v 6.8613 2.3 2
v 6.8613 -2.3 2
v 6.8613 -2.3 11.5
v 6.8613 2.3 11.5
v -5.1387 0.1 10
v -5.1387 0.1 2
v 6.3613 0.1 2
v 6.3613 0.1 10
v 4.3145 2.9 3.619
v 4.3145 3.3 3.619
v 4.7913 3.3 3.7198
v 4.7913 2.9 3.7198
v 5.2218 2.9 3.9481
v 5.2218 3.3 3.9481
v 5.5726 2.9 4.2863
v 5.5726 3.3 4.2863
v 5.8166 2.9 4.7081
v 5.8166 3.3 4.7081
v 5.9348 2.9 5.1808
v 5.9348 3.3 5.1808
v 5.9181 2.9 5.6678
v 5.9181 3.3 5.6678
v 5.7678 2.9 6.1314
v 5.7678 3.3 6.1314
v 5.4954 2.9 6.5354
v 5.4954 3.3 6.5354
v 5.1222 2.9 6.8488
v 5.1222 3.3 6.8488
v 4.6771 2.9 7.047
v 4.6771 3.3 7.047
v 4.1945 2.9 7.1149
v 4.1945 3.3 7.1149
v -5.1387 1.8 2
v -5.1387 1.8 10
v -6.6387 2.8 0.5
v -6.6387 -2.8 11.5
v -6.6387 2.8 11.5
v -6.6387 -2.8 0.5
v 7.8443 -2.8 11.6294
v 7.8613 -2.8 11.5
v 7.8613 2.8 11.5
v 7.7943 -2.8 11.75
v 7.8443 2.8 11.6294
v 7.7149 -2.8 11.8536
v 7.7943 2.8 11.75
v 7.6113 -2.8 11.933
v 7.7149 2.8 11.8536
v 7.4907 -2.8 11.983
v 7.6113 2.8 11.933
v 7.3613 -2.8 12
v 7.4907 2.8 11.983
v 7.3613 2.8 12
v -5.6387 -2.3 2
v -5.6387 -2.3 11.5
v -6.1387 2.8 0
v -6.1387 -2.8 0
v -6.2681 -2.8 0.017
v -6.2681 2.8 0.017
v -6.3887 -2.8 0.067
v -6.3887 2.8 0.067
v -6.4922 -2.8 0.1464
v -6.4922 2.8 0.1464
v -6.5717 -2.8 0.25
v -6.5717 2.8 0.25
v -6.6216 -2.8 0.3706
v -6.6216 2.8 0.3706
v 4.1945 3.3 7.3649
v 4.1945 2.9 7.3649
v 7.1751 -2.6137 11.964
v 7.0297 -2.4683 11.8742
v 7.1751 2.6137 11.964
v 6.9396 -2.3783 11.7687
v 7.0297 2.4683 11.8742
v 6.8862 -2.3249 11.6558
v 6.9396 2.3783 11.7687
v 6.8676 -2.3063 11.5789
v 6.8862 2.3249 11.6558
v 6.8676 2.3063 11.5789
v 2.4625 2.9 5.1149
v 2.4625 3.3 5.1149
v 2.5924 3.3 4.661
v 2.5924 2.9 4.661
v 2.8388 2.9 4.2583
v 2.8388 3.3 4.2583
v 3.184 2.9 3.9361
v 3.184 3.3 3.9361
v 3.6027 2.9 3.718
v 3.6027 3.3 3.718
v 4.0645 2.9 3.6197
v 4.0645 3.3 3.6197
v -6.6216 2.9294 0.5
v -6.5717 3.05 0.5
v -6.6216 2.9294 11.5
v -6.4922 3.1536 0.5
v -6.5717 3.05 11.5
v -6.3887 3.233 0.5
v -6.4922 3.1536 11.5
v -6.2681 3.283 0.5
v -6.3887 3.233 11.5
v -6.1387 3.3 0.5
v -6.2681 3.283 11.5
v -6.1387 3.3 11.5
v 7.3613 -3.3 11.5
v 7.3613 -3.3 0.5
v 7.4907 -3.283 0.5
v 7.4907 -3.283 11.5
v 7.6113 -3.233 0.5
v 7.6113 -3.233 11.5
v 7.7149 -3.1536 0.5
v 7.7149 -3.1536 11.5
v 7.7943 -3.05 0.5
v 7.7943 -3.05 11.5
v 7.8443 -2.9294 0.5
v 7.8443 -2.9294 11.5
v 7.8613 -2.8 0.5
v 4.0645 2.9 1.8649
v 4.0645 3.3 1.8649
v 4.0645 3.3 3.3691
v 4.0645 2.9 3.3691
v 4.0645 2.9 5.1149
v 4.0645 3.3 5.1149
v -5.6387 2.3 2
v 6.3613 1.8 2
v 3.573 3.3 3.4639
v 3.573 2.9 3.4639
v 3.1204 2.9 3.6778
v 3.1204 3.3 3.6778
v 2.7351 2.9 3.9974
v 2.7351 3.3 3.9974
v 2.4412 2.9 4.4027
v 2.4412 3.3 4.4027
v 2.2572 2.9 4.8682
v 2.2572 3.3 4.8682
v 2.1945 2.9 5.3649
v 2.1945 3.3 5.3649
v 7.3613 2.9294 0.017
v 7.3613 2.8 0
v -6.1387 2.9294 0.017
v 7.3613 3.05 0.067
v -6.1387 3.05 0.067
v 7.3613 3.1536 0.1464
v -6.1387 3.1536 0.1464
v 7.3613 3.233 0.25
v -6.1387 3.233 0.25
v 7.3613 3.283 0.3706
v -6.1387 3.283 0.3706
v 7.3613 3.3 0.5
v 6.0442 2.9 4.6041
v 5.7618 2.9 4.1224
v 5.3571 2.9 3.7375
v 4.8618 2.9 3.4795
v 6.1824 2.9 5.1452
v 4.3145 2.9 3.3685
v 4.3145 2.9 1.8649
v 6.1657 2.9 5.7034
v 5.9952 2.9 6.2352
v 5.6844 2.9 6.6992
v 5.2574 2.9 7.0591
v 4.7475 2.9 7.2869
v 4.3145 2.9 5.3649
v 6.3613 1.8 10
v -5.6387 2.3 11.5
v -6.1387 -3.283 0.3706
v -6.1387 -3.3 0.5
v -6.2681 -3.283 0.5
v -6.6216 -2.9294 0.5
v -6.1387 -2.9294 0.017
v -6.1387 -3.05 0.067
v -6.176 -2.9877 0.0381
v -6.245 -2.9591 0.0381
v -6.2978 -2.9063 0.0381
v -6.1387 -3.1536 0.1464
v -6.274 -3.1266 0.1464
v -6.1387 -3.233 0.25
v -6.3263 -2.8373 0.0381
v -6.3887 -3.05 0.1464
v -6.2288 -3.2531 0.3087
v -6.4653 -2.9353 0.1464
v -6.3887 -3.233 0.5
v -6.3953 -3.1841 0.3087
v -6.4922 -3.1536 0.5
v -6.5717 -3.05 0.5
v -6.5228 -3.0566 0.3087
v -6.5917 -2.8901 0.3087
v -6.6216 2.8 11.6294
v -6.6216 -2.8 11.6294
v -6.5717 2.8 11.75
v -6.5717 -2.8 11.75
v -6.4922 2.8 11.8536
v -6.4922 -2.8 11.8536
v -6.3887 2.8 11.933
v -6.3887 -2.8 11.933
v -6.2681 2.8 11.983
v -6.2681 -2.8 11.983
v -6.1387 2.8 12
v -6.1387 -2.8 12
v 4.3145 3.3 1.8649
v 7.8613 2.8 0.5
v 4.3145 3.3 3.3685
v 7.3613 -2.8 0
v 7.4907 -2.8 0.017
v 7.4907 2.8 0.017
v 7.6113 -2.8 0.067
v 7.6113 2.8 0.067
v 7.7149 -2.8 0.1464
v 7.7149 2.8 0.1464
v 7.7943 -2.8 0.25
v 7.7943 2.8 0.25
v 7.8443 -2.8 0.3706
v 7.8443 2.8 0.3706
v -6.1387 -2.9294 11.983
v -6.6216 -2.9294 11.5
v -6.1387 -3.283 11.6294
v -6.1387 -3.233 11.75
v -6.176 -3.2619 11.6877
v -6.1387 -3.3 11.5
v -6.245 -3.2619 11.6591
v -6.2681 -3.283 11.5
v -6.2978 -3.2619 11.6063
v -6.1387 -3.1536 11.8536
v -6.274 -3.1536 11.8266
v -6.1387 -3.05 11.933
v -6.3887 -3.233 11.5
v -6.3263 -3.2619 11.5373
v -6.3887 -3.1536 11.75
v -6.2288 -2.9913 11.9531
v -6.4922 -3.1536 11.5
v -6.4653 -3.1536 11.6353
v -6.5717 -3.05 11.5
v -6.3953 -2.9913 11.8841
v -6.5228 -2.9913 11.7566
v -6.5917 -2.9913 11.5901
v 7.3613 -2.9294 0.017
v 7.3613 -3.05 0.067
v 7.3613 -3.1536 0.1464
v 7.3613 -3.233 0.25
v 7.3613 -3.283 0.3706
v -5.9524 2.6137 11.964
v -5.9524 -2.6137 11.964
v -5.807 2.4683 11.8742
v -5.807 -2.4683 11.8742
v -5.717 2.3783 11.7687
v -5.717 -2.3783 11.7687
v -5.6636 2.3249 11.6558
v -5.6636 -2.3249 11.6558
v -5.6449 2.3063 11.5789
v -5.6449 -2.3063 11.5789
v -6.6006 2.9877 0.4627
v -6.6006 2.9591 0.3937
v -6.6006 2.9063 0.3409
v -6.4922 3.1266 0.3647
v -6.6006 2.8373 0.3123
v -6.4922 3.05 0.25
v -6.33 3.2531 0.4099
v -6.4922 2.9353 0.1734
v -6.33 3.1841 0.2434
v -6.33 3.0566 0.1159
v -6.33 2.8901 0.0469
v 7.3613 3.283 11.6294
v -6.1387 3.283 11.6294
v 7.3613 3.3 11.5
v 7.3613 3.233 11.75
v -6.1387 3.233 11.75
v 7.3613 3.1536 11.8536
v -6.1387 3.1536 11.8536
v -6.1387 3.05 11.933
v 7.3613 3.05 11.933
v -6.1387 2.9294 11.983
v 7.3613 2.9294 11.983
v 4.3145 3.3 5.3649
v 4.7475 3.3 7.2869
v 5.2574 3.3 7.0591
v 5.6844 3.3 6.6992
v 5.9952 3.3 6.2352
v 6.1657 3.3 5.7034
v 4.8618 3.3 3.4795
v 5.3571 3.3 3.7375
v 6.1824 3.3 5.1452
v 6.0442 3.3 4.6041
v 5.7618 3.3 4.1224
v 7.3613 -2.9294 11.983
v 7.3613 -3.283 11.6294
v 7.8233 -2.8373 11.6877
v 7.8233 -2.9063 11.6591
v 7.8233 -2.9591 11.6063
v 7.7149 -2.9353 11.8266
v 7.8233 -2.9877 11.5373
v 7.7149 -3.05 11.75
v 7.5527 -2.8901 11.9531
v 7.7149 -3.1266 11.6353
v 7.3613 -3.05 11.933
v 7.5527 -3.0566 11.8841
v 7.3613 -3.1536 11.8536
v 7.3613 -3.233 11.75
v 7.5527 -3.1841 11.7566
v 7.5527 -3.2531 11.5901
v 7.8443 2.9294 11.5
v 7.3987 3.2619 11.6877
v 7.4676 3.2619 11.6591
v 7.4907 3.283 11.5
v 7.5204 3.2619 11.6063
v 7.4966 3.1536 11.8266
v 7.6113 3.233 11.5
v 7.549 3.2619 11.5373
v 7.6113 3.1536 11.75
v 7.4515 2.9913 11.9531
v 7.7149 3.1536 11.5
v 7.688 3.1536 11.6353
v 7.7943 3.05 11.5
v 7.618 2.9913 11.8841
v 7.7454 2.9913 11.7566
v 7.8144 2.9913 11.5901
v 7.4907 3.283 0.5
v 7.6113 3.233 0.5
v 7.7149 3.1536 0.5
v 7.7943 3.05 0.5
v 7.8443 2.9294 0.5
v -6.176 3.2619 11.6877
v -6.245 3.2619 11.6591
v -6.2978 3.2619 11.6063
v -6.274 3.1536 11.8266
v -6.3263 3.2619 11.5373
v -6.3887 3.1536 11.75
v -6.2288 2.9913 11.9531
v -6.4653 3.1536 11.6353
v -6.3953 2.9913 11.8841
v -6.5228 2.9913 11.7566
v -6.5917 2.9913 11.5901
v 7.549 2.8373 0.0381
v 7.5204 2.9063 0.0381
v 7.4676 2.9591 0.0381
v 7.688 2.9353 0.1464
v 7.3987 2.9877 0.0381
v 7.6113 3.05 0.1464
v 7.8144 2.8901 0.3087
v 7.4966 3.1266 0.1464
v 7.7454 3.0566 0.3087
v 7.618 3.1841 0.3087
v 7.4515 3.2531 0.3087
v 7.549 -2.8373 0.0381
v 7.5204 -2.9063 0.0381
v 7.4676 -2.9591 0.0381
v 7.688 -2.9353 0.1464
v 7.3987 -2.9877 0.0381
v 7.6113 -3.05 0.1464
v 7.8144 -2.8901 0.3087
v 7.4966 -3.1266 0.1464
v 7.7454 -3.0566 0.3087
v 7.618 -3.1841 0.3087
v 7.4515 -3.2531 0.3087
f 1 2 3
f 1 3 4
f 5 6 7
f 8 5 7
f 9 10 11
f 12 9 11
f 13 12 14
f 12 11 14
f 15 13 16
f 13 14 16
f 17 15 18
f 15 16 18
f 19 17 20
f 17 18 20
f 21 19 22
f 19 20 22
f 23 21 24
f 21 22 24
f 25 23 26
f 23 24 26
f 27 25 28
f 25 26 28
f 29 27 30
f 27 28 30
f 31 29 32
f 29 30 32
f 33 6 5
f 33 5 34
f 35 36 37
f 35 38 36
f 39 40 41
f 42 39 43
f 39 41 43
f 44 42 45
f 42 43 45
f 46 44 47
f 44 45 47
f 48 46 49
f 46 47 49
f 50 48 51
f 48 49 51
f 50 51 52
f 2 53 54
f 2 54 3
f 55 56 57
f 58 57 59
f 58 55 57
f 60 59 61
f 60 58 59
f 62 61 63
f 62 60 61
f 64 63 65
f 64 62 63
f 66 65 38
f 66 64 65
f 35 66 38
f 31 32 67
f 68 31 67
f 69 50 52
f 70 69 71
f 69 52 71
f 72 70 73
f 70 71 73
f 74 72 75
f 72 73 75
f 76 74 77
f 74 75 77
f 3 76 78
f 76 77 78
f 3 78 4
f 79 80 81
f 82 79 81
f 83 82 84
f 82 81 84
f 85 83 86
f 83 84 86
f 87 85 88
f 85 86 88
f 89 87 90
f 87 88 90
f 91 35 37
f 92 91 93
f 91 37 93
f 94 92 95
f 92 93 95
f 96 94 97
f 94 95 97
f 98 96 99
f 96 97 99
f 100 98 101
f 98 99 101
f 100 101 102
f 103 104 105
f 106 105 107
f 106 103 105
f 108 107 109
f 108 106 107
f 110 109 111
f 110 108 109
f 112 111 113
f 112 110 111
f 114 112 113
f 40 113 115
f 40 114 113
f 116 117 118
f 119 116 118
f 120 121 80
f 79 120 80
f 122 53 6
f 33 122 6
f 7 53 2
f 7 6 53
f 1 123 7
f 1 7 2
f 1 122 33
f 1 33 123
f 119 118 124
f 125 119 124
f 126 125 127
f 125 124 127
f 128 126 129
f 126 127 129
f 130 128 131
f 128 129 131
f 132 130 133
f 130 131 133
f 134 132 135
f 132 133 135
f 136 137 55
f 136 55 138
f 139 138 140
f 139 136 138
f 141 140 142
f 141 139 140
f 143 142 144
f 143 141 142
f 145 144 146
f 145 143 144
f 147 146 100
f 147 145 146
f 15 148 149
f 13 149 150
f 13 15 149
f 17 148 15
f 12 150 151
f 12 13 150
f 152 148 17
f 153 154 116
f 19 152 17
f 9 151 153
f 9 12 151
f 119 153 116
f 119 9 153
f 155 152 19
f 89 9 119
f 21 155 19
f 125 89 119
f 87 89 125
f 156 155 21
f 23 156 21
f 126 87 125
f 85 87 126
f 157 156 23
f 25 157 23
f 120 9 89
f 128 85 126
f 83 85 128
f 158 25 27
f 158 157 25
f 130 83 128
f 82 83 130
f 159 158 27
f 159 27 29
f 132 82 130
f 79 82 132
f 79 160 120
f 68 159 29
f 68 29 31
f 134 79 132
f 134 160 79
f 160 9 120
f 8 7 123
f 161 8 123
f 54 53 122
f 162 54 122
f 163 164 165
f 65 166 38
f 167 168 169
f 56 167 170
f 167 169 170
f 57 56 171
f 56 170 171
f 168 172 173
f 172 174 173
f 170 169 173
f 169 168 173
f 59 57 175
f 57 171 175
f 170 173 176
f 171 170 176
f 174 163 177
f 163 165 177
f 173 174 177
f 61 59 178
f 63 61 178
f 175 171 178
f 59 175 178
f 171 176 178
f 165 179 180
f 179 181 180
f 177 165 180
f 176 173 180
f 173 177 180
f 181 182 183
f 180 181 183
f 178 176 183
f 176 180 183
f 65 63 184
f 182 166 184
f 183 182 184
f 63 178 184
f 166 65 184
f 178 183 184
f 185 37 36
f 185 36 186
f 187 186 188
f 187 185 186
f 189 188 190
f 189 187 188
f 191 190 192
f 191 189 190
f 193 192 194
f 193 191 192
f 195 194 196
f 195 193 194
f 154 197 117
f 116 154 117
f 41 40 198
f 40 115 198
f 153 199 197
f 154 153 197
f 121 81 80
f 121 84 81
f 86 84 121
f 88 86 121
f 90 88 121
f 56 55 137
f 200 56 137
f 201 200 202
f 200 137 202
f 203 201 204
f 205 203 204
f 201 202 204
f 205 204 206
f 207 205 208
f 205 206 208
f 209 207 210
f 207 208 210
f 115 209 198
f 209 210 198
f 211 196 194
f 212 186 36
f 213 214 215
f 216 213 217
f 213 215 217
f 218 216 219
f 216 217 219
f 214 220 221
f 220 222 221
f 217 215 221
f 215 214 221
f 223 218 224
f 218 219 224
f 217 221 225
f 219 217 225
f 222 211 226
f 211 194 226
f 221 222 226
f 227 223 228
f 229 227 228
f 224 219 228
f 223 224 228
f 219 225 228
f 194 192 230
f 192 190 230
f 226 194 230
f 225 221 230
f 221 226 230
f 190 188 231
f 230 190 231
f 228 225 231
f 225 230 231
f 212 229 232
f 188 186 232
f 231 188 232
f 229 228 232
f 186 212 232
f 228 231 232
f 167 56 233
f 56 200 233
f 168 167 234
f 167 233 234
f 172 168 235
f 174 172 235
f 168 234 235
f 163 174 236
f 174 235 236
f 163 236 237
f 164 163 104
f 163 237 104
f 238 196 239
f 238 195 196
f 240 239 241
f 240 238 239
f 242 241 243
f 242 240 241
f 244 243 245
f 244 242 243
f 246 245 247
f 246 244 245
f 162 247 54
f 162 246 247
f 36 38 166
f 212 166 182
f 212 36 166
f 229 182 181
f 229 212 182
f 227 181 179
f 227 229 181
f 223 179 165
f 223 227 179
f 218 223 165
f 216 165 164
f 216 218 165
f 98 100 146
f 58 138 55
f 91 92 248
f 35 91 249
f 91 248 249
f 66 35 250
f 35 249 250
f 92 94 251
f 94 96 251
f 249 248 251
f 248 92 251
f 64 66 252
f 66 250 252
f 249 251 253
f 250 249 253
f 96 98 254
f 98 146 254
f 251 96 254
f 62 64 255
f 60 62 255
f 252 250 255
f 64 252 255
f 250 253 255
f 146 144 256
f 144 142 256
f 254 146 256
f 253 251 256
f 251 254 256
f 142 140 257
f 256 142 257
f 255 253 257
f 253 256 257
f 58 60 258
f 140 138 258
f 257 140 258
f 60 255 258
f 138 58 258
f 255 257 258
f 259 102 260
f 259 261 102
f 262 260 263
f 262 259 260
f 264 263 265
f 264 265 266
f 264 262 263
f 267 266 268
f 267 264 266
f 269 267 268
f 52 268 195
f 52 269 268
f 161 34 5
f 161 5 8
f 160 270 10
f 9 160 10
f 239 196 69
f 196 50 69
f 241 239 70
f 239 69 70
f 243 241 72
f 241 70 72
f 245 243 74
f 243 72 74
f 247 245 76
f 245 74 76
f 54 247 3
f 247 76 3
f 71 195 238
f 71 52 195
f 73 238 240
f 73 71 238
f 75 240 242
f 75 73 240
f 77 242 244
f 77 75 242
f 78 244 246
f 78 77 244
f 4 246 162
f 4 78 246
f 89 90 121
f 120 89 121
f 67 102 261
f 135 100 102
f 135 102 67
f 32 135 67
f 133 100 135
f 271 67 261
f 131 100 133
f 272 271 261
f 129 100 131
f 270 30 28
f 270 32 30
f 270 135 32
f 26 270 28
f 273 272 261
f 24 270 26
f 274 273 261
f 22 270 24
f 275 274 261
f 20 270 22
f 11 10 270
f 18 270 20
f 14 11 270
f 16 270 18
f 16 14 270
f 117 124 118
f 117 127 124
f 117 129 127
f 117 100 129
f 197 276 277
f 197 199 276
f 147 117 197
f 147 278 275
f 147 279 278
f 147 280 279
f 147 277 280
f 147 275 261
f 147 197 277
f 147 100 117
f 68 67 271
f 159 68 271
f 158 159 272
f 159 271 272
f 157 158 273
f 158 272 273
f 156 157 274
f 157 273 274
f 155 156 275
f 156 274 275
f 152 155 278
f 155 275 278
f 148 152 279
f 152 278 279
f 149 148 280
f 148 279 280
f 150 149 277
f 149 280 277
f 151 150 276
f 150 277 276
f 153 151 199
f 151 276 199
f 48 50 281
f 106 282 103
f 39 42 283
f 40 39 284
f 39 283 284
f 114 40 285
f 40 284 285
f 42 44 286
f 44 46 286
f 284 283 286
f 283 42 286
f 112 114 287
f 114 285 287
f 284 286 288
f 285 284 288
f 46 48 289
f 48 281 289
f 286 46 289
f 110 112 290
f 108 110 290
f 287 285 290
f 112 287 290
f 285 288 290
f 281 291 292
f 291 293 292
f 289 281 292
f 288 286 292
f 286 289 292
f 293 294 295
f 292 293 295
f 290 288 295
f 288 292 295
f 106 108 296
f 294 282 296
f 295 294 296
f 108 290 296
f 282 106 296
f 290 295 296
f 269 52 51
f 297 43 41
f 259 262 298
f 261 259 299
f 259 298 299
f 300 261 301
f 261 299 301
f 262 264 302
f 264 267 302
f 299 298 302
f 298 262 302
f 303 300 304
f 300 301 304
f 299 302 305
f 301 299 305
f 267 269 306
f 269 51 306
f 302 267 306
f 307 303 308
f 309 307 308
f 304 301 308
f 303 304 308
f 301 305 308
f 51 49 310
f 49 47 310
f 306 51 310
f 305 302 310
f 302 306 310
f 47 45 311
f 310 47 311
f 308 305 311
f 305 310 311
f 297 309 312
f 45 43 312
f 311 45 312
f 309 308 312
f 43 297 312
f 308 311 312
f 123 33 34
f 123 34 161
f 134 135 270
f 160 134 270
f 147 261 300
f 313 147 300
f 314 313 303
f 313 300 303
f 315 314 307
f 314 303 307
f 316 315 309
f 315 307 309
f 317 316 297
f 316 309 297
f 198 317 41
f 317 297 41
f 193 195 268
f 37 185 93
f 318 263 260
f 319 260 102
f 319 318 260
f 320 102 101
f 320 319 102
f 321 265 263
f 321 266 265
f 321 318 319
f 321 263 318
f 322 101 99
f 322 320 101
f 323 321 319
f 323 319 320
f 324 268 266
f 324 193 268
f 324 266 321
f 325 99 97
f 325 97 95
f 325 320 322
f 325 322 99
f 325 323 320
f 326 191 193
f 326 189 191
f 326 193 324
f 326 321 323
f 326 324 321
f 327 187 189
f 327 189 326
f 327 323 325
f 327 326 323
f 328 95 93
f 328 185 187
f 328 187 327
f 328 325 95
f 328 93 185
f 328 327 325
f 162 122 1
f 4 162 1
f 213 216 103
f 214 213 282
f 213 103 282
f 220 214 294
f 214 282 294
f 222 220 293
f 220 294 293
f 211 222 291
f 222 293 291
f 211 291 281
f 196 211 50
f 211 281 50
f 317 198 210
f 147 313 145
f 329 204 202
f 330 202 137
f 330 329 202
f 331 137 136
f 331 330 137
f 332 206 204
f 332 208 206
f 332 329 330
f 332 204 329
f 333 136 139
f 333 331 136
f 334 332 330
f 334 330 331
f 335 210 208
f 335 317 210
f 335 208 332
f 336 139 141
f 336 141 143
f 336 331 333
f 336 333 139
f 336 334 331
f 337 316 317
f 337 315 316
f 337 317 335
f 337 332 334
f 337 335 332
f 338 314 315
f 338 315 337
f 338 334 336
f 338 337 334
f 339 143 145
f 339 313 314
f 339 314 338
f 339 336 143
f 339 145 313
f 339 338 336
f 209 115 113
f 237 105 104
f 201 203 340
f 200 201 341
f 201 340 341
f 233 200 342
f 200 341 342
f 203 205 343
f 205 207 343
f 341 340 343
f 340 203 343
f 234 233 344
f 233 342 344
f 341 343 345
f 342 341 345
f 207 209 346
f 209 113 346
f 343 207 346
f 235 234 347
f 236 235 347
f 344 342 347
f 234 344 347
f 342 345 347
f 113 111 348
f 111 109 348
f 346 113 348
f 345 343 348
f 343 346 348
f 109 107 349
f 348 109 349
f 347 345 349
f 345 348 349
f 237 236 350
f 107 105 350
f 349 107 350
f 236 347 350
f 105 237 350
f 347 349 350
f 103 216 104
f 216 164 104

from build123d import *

# Parameters (mm, degrees)
F0_W     = 14.5
F0_H     = 6.6
F0_W_2   = 12.5
F0_H_2   = 4.6
F1_DEPTH = 12
F0_W_3   = 11.5
F0_H_3   = 1.7
F2_DEPTH = 2
F3_DEPTH = 10
F4_R     = 0.49999
F6_DEPTH = 0.4


# Not quite as in the source:
# - a fillet or chamfer is up to 0.001 mm smaller than in the source, because OpenCascade refuses the exact size


with BuildPart() as f1:
    # F0 (on Top) → F1 (new body)
    with BuildSketch(Plane.XY):
        with Locations((0.6113282288, 0)):
            Rectangle(F0_W, F0_H)
        with Locations((0.6113282288, 0)):
            Rectangle(F0_W_2, F0_H_2, mode=Mode.SUBTRACT)
    extrude(amount=F1_DEPTH)

    # F0 (on Top) → F2 (join)
    with BuildSketch(Plane.XY):
        with Locations((0.6113282288, 0)):
            Rectangle(F0_W_2, F0_H_2)
        with Locations((0.6113282288, 0.95)):
            Rectangle(F0_W_3, F0_H_3, mode=Mode.SUBTRACT)
        with Locations((0.6113282288, 0.95)):
            Rectangle(F0_W_3, F0_H_3)
    extrude(amount=F2_DEPTH)

    # F0 (on Top) → F3 (join)
    with BuildSketch(Plane.XY):
        with Locations((0.6113282288, 0.95)):
            Rectangle(F0_W_3, F0_H_3)
    extrude(amount=F3_DEPTH)

    # F4 (radius 0.5 in the source; OpenCascade refuses exactly that, so slightly less here)
    f4_edges = [f1.edges().sort_by_distance(p)[0] for p in [
        (-6.638672, 0, 12),
        (0.611328, -3.3, 12),
        (7.861328, 0, 12),
        (0.611328, 3.3, 12),
        (-5.638672, 0, 12),
        (0.611328, 2.3, 12),
        (6.861328, 0, 12),
        (0.611328, -2.3, 12),
        (7.861328, 3.3, 6),
        (7.861328, -3.3, 6),
        (7.861328, 0, 0),
        (0.611328, 3.3, 0),
        (-6.638672, 3.3, 6),
        (-6.638672, -3.3, 6),
        (0.611328, -3.3, 0),
        (-6.638672, 0, 0),
    ]]
    fillet(f4_edges, radius=F4_R)

    # F5 (on face) → F6 (cut)
    with BuildSketch(Plane(origin=(0, 3.3, 0), x_dir=(-1, 0, 0), z_dir=(0, 1, 0))):
        with BuildLine():
            Line((-4.1945352975, 7.1148852238), (-4.1945352975, 7.3648852238))
            ThreePointArc((-4.1945352975, 7.3648852238), (-6.193634283, 5.4249122664), (-4.3145352975, 3.3684884696))
            Line((-4.3145352975, 3.3684884696), (-4.3145352975, 3.6190043573))
            ThreePointArc((-4.3145352975, 3.6190043573), (-5.9435052109, 5.4249205618), (-4.1945352975, 7.1148852238))
        make_face()
        with BuildLine():
            Line((-4.3145352975, 3.6190043573), (-4.3145352975, 3.3684884696))
            ThreePointArc((-4.3145352975, 3.3684884696), (-4.1895255031, 3.3648914983), (-4.0645352975, 3.3691146959))
            Line((-4.0645352975, 3.3691146959), (-4.0645352975, 3.6197204751))
            ThreePointArc((-4.0645352975, 3.6197204751), (-4.1895224932, 3.6148924033), (-4.3145352975, 3.6190043573))
        make_face()
        with BuildLine():
            ThreePointArc((-4.0645352975, 3.3691146959), (-4.1895255031, 3.3648914983), (-4.3145352975, 3.3684884696))
            Line((-4.3145352975, 3.3684884696), (-4.3145352975, 1.8648852238))
            Line((-4.3145352975, 1.8648852238), (-4.0645352975, 1.8648852238))
            Line((-4.0645352975, 1.8648852238), (-4.0645352975, 3.3691146959))
        make_face()
        with BuildLine():
            Line((-4.0645352975, 3.6197204751), (-4.0645352975, 3.3691146959))
            ThreePointArc((-4.0645352975, 3.3691146959), (-2.7350833455, 3.9974057907), (-2.1945352975, 5.3648852238))
            Line((-2.1945352975, 5.3648852238), (-2.4445352975, 5.3648852238))
            ThreePointArc((-2.4445352975, 5.3648852238), (-2.4490283635, 5.2395634644), (-2.4624844899, 5.1148852238))
            ThreePointArc((-2.4624844899, 5.1148852238), (-3.000513644, 4.0855055729), (-4.0645352975, 3.6197204751))
        make_face()
        with BuildLine():
            Line((-4.3145352975, 5.3648852238), (-4.3145352975, 3.6190043573))
            ThreePointArc((-4.3145352975, 3.6190043573), (-4.1895224932, 3.6148924033), (-4.0645352975, 3.6197204751))
            Line((-4.0645352975, 3.6197204751), (-4.0645352975, 5.1148852238))
            Line((-4.0645352975, 5.1148852238), (-2.4624844899, 5.1148852238))
            ThreePointArc((-2.4624844899, 5.1148852238), (-2.4490283635, 5.2395634644), (-2.4445352975, 5.3648852238))
            Line((-2.4445352975, 5.3648852238), (-4.3145352975, 5.3648852238))
        make_face()
    extrude(amount=-F6_DEPTH, mode=Mode.SUBTRACT)


solid = f1.part
